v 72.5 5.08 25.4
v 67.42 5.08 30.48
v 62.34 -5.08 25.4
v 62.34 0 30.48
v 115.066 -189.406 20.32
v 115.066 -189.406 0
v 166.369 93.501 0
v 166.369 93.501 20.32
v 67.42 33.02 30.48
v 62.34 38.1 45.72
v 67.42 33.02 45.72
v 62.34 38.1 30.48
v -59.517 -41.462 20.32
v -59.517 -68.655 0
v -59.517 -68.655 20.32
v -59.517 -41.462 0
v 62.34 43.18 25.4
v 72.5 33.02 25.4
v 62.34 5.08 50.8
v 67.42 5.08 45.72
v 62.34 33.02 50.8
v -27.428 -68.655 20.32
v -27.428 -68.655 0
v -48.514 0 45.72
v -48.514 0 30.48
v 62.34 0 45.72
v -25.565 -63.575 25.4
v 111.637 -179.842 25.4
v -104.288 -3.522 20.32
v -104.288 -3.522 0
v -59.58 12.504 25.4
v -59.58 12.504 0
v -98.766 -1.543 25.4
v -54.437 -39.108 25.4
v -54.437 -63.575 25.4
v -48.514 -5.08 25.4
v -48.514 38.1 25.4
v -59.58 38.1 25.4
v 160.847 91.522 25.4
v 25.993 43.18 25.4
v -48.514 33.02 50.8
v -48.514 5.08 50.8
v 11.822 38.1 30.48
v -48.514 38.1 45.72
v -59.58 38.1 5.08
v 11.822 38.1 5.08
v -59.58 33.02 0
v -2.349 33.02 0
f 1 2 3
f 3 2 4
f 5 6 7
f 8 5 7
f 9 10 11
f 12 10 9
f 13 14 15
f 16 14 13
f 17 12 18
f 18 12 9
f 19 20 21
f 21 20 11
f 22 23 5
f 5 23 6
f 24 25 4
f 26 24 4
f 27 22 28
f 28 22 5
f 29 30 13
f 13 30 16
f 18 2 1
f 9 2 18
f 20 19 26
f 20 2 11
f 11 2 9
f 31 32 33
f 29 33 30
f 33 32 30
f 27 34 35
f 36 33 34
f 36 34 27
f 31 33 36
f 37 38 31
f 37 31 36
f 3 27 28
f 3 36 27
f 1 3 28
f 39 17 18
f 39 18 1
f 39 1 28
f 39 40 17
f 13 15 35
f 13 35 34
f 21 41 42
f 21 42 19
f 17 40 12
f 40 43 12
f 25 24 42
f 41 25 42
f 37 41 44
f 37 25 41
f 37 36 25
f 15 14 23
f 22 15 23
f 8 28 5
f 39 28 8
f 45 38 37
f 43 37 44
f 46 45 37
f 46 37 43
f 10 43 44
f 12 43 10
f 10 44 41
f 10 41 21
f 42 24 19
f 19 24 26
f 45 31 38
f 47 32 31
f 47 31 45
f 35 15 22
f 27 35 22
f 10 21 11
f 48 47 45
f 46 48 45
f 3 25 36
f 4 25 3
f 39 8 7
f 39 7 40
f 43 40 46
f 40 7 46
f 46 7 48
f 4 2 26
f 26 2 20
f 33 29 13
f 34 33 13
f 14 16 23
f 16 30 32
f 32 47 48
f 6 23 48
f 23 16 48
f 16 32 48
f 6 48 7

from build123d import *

# Parameters (mm, degrees)
F0_W     = 127
F0_H     = 38.1
F1_DEPTH = 25.4
F2_W     = 115.9340298213
F2_H     = 38.1
F3_DEPTH = 25.4
F4_W     = 127
F4_H     = 68.654977391
F5_DEPTH = 25.4
F7_DEPTH = 25.4
F8_SIZE  = 5.08


# Not quite as in the source:
# - the program builds the solid bodies; features that only make, move or delete a surface that nothing else refers to are left out


with BuildPart() as f1:
    # F0 (on Top) → F1 (new body)
    with BuildSketch(Plane.XY):
        with Locations((3.9197548818, 19.05)):
            Rectangle(F0_W, F0_H)
    extrude(amount=F1_DEPTH)

    # F2 (on face) → F3 (join)
    with BuildSketch(Plane.XY.offset(25.4)):
        with Locations((9.4527399712, 19.05)):
            Rectangle(F2_W, F2_H)
    extrude(amount=F3_DEPTH)

    # F4 (on Top) → F5 (join)
    with BuildSketch(Plane.XY):
        with Locations((3.9833925518, -34.3274886955)):
            Rectangle(F4_W, F4_H)
    extrude(amount=F5_DEPTH)

    # F6 (on Top) → F7 (join)
    with BuildSketch(Plane.XY):
        Polygon((115.0657710181, -189.4061209801), (166.3690629853, 93.5014354232), (-104.2877137661, -3.5223886371), align=None)
    extrude(amount=F7_DEPTH)

    # F8
    f8_edges = [f1.edges().sort_by_distance(p)[0] for p in [
        (140.717417, -47.952343, 25.4),
        (43.819127, -129.030549, 25.4),
        (-43.472062, -68.654977, 25.4),
        (-59.516607, -55.058567, 25.4),
        (-81.902161, -22.492273, 25.4),
        (9.45274, 0, 50.8),
        (-23.879261, 38.1, 0),
        (9.45274, 38.1, 50.8),
        (67.419755, 19.05, 50.8),
        (67.419755, 0, 38.1),
        (67.419755, 19.05, 25.4),
        (67.419755, 38.1, 38.1),
        (39.620739, 38.1, 25.4),
        (9.45274, 0, 25.4),
    ]]
    chamfer(f8_edges, length=F8_SIZE)


solid = f1.part
